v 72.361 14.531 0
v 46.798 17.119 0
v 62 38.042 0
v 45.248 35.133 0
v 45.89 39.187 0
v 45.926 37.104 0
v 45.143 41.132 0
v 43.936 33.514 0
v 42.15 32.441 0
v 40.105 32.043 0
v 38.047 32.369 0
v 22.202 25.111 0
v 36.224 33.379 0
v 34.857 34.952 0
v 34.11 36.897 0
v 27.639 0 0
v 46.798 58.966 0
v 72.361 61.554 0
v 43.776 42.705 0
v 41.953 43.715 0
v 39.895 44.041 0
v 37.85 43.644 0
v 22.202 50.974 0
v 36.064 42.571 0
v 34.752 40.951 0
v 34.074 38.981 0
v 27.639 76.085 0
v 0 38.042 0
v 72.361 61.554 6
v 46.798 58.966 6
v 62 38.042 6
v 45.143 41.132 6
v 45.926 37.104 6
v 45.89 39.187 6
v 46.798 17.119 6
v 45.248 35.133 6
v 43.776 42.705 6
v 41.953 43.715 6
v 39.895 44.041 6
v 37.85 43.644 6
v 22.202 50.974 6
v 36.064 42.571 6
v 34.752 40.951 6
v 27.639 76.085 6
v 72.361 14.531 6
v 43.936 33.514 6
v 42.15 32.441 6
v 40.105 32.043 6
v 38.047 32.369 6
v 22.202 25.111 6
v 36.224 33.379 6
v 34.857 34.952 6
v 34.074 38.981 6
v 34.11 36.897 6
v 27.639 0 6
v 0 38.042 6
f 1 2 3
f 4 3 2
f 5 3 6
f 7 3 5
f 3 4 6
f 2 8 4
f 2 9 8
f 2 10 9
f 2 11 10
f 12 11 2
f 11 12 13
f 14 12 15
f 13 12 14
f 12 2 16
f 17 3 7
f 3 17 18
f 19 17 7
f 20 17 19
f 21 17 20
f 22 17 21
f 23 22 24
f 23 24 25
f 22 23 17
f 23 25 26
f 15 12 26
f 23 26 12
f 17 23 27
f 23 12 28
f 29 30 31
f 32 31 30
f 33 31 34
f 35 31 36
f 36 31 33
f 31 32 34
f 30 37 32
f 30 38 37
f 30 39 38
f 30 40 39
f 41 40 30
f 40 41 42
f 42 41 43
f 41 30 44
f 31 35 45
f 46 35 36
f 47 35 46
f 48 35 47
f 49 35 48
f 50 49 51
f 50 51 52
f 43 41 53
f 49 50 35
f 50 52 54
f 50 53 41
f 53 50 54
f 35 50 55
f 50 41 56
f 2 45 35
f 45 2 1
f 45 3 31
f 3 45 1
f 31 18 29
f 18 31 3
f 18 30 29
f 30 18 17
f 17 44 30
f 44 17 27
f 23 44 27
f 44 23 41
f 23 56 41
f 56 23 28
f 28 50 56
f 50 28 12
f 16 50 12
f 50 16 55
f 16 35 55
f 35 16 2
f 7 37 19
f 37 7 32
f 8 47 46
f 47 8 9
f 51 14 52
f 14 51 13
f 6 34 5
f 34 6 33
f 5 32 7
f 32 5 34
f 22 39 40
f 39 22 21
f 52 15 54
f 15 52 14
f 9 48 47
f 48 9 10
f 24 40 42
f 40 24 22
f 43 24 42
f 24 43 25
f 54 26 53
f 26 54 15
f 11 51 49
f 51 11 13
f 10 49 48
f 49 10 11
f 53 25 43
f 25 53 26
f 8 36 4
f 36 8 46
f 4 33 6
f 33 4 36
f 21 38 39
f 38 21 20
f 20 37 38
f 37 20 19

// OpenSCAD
$fn = 32;

// ----------------------------------------------------------------------
// Star wheel: 5-point star, R40
// ----------------------------------------------------------------------

// --- parameters (mm) ---
n_points = 5;             // number of points / teeth
r_out = 40;               // tip radius
r_in = 22;                // root radius
bore_r = 6;               // centre bore radius
plate_t = 6;              // plate thickness, Z (extrusion height)
bore_d = 12;              // centre bore diameter

profile = [[0, 38.042], [22.202, 25.111], [27.639, 0], [46.798, 17.119], [72.361, 14.531], [62, 38.042], [72.361, 61.554], [46.798, 58.966], [27.639, 76.085], [22.202, 50.974]];  // primary outline, 10 points, counter clockwise
void_1 = [[45.89, 39.187], [45.143, 41.132], [43.776, 42.705], [41.953, 43.715], [39.895, 44.041], [37.85, 43.644], [36.064, 42.571], [34.752, 40.951], [34.074, 38.981], [34.11, 36.897], [34.857, 34.952], [36.224, 33.379], [38.047, 32.369], [40.105, 32.043], [42.15, 32.441], [43.936, 33.514], [45.248, 35.133], [45.926, 37.104]];  // centre bore, 18 points

// --- the one profile operation ---
difference() {
  linear_extrude(height = plate_t) polygon(points = profile);
  translate([0, 0, -1])
    linear_extrude(height = plate_t + 2) polygon(points = void_1);
}
